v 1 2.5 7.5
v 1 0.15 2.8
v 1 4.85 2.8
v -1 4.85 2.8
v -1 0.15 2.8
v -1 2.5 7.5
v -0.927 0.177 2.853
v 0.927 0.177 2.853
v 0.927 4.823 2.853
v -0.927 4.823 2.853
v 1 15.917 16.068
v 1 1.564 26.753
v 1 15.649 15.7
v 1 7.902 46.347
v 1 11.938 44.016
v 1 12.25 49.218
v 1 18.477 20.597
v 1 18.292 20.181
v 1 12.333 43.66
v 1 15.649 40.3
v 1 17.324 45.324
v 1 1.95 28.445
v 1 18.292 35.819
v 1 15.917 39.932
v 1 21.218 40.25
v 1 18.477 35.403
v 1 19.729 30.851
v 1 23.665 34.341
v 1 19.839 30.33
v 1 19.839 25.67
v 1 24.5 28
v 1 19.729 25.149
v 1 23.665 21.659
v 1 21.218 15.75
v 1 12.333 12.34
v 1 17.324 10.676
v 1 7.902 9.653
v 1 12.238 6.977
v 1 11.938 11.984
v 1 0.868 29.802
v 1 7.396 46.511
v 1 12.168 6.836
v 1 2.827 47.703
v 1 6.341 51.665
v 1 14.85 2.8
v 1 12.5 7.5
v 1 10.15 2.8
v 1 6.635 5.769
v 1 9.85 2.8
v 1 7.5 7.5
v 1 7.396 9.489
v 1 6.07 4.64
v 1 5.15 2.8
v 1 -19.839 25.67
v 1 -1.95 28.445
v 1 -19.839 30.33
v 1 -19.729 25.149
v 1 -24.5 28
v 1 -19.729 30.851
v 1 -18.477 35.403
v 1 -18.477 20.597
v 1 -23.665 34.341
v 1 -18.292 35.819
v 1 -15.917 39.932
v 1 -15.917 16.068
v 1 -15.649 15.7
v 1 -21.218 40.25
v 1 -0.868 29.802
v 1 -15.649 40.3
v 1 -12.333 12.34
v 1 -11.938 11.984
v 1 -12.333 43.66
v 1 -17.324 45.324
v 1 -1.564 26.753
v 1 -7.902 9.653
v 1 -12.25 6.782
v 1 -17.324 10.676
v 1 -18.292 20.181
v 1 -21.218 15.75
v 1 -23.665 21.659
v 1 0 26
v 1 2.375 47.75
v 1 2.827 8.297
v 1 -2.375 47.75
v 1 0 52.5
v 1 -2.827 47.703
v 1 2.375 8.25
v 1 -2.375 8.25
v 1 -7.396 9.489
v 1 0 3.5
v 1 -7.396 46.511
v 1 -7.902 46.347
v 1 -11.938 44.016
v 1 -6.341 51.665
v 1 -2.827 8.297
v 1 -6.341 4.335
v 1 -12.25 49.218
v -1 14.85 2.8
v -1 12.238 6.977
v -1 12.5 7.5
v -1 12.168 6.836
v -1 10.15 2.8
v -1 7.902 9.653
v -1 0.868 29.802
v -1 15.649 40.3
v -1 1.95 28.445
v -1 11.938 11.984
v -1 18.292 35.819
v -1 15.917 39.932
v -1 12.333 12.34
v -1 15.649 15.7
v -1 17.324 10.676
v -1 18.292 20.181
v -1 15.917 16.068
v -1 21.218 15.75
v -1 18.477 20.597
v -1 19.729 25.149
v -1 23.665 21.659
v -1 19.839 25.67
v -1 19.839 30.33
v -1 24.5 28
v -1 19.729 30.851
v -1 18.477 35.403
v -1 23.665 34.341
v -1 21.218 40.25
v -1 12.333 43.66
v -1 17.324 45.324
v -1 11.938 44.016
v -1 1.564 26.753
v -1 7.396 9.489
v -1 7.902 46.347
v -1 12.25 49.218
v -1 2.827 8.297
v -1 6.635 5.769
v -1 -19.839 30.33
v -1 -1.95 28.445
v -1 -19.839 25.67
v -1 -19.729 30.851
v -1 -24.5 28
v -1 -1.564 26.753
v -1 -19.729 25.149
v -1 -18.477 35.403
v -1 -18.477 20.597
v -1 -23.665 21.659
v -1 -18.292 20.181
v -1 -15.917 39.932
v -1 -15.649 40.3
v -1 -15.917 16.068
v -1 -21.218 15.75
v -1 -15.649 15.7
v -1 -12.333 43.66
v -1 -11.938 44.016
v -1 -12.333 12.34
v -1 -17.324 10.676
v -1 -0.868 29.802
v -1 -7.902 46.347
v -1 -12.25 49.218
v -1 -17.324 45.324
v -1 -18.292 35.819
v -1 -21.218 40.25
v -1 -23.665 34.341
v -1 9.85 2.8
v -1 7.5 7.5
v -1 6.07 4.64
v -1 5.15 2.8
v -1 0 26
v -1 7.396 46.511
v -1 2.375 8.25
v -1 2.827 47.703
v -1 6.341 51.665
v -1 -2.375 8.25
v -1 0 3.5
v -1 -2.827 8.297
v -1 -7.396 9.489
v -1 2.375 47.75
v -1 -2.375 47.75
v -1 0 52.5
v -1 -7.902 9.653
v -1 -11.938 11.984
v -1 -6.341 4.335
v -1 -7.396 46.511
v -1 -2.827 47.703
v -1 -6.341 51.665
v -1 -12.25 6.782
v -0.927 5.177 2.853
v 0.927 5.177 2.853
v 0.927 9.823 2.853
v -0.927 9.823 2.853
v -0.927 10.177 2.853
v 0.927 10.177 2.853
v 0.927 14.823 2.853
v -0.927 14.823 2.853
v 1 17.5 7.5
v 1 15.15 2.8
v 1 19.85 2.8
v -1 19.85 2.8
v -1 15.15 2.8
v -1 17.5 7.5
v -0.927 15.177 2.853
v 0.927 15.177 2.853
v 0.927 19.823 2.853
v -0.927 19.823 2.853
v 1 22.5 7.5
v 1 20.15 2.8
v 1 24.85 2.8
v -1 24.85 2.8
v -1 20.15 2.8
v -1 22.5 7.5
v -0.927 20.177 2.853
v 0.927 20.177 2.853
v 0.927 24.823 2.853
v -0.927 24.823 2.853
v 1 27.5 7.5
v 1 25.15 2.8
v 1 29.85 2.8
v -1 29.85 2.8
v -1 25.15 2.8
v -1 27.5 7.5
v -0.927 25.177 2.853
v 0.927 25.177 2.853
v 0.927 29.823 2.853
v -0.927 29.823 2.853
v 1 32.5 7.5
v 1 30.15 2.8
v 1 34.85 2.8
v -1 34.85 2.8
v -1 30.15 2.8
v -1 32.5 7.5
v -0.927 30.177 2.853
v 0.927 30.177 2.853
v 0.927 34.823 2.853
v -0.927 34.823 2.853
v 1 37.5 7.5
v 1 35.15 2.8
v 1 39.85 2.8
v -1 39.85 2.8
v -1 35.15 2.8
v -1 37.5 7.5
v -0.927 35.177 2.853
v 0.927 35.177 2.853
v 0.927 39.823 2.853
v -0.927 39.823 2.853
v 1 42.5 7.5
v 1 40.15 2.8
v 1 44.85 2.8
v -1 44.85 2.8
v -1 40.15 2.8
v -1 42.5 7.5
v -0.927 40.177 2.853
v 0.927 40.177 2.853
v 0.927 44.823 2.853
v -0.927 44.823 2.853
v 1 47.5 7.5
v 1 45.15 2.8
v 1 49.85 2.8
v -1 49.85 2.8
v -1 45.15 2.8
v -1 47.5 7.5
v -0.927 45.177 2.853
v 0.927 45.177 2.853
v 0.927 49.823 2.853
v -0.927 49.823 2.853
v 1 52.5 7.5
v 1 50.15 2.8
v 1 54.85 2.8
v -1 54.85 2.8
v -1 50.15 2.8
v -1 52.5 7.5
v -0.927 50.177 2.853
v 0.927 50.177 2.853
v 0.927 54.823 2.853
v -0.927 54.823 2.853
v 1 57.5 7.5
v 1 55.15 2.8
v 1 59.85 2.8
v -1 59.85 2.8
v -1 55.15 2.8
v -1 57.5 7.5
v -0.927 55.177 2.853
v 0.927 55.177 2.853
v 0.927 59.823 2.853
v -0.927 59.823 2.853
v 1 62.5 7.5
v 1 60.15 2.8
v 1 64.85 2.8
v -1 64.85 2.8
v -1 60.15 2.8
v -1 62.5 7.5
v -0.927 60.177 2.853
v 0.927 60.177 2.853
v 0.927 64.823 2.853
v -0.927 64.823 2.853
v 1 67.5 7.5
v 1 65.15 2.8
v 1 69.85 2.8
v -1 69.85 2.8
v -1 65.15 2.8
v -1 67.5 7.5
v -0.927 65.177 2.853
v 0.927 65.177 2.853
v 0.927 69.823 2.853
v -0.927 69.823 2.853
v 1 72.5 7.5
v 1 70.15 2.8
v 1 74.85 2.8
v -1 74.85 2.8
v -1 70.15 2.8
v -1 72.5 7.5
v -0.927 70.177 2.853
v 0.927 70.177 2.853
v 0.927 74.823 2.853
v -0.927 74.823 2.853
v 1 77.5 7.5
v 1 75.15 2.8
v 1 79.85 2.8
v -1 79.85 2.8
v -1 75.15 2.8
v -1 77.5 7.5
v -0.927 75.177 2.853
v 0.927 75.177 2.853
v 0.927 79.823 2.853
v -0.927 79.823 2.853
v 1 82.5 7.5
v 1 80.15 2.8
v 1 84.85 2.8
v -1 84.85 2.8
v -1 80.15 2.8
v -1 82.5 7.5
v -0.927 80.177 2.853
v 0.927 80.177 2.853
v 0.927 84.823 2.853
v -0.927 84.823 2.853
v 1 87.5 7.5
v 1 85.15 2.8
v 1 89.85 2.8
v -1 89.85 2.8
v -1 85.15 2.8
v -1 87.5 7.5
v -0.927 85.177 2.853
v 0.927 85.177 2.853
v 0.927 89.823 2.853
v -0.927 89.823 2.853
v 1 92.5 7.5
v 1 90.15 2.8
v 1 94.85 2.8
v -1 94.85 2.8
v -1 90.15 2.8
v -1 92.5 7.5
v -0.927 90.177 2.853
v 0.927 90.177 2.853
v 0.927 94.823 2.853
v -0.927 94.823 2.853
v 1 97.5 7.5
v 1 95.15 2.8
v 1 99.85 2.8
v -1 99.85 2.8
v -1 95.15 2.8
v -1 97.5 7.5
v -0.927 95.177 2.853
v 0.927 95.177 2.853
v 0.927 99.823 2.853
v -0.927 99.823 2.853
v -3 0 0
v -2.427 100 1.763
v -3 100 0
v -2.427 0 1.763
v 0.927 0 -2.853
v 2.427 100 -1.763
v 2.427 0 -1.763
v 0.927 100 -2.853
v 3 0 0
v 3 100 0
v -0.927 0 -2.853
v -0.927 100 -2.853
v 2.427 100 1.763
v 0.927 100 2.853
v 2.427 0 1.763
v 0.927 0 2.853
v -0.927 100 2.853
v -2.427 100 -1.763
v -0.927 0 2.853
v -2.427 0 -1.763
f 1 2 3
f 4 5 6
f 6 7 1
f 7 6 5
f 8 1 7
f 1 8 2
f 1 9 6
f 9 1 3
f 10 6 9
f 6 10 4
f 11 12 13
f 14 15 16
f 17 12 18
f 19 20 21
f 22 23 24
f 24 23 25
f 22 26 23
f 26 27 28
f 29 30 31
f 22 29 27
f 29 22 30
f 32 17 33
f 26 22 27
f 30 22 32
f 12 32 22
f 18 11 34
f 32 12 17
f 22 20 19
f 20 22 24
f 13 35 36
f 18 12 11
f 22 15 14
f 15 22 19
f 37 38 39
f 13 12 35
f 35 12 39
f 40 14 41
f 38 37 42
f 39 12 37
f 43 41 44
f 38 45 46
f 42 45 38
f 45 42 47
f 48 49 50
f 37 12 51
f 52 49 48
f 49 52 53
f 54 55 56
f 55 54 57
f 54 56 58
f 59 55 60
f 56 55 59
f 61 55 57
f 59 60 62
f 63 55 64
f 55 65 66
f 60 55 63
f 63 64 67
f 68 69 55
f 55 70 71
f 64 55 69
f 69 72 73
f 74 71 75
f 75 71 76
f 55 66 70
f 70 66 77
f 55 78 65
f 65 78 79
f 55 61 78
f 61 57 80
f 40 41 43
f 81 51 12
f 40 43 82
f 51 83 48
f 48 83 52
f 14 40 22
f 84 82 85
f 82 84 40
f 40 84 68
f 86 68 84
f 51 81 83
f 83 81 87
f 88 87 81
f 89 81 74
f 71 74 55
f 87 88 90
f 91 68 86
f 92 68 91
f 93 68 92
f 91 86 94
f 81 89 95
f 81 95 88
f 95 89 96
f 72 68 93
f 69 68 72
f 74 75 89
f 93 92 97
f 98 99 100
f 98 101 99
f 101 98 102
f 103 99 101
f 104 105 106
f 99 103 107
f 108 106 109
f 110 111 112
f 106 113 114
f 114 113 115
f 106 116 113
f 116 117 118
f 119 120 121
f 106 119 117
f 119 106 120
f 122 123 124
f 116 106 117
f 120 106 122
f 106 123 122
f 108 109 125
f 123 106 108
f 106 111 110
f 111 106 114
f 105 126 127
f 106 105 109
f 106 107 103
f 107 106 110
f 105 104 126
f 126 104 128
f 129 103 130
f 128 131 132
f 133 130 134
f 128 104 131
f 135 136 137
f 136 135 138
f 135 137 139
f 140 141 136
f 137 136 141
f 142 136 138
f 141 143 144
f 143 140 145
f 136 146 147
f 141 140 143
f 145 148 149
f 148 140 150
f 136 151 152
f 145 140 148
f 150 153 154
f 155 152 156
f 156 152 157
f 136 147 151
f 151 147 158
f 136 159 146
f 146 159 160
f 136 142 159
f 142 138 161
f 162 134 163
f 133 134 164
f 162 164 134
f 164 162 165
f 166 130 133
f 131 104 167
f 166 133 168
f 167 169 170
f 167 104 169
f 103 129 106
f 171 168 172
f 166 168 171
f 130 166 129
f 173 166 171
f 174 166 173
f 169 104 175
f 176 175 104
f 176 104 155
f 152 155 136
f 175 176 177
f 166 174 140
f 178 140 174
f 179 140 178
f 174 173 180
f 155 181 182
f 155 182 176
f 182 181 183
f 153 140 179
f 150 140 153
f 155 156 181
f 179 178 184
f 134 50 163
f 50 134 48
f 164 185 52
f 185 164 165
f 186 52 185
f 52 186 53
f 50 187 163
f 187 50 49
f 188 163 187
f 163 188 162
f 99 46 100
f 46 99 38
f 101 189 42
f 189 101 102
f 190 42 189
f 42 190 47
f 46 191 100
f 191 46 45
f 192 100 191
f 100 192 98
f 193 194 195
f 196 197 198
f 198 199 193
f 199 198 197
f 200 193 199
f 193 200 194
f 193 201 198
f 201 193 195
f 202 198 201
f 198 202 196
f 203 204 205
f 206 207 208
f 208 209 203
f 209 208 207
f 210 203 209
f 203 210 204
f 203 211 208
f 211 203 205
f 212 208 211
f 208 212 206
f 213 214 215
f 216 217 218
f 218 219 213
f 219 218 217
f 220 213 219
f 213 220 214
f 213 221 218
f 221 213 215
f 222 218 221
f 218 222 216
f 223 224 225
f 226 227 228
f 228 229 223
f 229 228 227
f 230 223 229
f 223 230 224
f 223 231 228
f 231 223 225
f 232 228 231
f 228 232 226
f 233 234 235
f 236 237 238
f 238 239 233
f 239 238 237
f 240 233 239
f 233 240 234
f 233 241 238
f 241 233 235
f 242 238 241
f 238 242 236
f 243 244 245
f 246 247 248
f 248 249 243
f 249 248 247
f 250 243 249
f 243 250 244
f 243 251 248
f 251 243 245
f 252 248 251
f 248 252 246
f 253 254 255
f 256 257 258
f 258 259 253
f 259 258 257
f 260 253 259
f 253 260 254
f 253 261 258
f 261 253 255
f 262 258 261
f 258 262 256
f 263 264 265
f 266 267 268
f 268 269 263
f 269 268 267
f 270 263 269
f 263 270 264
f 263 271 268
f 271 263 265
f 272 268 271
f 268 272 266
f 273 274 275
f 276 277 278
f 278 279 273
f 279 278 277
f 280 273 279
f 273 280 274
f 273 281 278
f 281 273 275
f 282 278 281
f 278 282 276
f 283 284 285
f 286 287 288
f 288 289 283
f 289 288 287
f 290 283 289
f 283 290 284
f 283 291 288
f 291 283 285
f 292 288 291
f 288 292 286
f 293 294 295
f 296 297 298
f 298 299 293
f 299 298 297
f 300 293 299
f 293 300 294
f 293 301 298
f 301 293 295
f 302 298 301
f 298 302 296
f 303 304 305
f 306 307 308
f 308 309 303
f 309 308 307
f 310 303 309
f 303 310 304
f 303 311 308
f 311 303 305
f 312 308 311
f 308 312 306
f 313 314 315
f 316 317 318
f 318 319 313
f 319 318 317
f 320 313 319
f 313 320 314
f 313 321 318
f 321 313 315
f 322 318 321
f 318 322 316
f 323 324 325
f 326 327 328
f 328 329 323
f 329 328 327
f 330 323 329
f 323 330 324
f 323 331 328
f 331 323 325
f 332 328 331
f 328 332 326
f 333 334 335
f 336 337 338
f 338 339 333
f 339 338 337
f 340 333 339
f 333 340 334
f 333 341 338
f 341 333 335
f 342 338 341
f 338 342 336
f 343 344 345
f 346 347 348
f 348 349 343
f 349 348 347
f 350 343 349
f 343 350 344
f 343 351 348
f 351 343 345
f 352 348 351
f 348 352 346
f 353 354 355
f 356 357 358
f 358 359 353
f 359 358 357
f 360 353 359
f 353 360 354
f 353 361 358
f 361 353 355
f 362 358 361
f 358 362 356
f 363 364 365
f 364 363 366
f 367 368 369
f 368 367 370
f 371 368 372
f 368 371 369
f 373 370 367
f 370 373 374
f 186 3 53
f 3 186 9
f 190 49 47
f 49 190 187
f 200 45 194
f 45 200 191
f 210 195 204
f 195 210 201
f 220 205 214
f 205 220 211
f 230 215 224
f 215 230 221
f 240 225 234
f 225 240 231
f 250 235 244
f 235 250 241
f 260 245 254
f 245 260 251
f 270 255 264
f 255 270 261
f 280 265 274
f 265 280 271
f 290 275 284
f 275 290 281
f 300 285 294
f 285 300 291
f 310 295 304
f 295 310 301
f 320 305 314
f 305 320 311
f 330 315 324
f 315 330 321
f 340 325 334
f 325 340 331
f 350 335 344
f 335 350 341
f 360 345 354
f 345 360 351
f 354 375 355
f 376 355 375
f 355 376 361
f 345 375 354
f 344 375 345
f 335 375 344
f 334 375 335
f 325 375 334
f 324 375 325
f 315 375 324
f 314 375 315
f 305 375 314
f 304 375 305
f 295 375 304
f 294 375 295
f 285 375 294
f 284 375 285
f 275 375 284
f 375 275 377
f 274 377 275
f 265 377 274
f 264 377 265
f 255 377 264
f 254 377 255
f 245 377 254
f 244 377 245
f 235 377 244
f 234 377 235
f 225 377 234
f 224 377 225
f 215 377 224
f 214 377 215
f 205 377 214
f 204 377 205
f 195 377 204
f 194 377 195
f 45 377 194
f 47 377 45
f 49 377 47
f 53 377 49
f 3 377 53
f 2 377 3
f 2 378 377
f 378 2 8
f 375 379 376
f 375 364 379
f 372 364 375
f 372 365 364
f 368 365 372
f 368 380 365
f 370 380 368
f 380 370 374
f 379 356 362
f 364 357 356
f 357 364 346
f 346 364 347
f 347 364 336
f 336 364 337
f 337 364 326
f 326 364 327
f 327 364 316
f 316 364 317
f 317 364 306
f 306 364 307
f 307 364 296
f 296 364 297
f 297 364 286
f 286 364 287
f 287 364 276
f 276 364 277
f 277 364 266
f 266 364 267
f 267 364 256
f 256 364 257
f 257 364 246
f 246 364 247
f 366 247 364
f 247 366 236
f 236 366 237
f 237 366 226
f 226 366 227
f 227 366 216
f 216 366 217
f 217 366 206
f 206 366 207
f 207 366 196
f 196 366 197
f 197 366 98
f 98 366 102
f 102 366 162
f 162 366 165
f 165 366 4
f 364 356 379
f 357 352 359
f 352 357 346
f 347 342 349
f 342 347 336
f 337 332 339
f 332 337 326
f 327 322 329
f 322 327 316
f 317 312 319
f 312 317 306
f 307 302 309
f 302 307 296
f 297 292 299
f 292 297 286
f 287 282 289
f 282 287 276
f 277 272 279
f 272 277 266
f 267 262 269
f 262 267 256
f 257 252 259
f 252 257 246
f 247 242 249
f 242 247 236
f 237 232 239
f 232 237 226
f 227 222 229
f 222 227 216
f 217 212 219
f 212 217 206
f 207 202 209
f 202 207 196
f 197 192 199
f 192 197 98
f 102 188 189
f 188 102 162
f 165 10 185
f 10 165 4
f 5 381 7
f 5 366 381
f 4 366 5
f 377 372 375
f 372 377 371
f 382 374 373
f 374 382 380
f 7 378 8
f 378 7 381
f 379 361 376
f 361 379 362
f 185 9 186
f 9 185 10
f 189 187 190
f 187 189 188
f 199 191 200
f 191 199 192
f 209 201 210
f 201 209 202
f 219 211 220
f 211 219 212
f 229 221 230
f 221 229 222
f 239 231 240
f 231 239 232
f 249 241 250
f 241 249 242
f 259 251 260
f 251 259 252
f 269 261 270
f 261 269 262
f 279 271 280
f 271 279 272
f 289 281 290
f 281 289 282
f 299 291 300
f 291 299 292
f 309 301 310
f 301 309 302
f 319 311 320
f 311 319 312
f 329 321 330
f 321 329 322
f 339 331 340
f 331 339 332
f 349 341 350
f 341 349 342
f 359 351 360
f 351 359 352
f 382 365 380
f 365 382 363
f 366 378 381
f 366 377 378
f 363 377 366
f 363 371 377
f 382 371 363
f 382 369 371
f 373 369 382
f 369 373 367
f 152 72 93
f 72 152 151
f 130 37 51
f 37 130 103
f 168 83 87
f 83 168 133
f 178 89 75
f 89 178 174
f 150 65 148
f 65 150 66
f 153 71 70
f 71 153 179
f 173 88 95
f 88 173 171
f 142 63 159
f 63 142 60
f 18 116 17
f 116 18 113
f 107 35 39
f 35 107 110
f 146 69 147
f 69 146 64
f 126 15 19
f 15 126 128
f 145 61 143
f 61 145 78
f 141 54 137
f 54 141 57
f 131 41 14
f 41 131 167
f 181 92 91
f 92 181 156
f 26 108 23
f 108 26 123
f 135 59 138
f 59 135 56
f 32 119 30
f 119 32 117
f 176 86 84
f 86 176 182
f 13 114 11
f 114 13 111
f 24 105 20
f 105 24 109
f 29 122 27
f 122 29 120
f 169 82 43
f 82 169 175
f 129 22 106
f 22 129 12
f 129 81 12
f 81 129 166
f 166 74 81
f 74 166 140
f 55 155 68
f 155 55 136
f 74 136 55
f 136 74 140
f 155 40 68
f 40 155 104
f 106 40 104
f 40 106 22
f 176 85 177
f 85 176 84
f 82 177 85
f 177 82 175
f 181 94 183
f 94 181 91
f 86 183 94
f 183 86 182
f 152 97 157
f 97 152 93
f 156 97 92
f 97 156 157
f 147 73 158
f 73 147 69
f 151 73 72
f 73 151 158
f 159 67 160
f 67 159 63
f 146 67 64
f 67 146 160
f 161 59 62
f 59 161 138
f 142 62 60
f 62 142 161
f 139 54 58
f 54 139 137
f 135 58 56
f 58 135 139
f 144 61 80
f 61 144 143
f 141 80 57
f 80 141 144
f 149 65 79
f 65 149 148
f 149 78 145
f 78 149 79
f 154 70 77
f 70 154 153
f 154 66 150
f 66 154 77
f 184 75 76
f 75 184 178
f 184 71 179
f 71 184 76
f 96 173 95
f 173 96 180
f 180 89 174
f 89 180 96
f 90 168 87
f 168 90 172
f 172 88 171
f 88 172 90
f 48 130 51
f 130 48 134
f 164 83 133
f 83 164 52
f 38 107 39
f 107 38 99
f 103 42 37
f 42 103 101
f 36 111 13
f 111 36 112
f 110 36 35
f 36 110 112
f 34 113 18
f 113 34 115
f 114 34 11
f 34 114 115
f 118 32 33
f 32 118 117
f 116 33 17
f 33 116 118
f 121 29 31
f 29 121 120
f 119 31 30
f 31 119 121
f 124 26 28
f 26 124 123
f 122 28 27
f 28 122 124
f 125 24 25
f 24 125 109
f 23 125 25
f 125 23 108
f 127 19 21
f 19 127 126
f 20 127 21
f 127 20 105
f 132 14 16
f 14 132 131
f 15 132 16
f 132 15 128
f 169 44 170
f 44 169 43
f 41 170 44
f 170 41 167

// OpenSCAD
module CogPole(pole_len, pole_width, cog_width, cog_height,cog_th)
{
	rotate([-90,0,0])cylinder(pole_len,pole_width,pole_width);
	cog_num = pole_len/cog_width;

	for(s_x = [0:cog_width:pole_len-cog_width]){
		translate([-(cog_th/2),s_x,(pole_width/2)+1])Cog(cog_width,cog_height,cog_th);
	}

}

module Gear(gear_width, gear_th, cog_height, cog_width)
{
	difference()
	{
		cylinder(gear_th,gear_width,gear_width);
		cylinder(gear_width+2,2,2);
	}

	for(step = [0:15:360])
	{
		
		rotate([0,0,step])translate([-gear_width+0.5,-cog_width/2,0])rotate([0,-90,0])Cog(cog_width,cog_height,gear_th);
	}
}

module Cog(width, height, thickness)
{
	alpha = atan(height/(width/2));
	x = height*sin(90-alpha);
	y = height/sin(alpha);
	difference(){
	difference(){
		cube([thickness, width, height]);
		rotate([alpha,0,0])translate([-1,0,0])cube([thickness+2,y,x]);
	}
	translate([0,width,0])rotate([90-alpha,0,0])translate([-1,x,0])rotate([90,0,0])cube([thickness+2,y,x]);
}
}

CogPole(100,3,5,5,2);
translate([-1,0,28])rotate([0,90,0])Gear(20,2,5,5);
